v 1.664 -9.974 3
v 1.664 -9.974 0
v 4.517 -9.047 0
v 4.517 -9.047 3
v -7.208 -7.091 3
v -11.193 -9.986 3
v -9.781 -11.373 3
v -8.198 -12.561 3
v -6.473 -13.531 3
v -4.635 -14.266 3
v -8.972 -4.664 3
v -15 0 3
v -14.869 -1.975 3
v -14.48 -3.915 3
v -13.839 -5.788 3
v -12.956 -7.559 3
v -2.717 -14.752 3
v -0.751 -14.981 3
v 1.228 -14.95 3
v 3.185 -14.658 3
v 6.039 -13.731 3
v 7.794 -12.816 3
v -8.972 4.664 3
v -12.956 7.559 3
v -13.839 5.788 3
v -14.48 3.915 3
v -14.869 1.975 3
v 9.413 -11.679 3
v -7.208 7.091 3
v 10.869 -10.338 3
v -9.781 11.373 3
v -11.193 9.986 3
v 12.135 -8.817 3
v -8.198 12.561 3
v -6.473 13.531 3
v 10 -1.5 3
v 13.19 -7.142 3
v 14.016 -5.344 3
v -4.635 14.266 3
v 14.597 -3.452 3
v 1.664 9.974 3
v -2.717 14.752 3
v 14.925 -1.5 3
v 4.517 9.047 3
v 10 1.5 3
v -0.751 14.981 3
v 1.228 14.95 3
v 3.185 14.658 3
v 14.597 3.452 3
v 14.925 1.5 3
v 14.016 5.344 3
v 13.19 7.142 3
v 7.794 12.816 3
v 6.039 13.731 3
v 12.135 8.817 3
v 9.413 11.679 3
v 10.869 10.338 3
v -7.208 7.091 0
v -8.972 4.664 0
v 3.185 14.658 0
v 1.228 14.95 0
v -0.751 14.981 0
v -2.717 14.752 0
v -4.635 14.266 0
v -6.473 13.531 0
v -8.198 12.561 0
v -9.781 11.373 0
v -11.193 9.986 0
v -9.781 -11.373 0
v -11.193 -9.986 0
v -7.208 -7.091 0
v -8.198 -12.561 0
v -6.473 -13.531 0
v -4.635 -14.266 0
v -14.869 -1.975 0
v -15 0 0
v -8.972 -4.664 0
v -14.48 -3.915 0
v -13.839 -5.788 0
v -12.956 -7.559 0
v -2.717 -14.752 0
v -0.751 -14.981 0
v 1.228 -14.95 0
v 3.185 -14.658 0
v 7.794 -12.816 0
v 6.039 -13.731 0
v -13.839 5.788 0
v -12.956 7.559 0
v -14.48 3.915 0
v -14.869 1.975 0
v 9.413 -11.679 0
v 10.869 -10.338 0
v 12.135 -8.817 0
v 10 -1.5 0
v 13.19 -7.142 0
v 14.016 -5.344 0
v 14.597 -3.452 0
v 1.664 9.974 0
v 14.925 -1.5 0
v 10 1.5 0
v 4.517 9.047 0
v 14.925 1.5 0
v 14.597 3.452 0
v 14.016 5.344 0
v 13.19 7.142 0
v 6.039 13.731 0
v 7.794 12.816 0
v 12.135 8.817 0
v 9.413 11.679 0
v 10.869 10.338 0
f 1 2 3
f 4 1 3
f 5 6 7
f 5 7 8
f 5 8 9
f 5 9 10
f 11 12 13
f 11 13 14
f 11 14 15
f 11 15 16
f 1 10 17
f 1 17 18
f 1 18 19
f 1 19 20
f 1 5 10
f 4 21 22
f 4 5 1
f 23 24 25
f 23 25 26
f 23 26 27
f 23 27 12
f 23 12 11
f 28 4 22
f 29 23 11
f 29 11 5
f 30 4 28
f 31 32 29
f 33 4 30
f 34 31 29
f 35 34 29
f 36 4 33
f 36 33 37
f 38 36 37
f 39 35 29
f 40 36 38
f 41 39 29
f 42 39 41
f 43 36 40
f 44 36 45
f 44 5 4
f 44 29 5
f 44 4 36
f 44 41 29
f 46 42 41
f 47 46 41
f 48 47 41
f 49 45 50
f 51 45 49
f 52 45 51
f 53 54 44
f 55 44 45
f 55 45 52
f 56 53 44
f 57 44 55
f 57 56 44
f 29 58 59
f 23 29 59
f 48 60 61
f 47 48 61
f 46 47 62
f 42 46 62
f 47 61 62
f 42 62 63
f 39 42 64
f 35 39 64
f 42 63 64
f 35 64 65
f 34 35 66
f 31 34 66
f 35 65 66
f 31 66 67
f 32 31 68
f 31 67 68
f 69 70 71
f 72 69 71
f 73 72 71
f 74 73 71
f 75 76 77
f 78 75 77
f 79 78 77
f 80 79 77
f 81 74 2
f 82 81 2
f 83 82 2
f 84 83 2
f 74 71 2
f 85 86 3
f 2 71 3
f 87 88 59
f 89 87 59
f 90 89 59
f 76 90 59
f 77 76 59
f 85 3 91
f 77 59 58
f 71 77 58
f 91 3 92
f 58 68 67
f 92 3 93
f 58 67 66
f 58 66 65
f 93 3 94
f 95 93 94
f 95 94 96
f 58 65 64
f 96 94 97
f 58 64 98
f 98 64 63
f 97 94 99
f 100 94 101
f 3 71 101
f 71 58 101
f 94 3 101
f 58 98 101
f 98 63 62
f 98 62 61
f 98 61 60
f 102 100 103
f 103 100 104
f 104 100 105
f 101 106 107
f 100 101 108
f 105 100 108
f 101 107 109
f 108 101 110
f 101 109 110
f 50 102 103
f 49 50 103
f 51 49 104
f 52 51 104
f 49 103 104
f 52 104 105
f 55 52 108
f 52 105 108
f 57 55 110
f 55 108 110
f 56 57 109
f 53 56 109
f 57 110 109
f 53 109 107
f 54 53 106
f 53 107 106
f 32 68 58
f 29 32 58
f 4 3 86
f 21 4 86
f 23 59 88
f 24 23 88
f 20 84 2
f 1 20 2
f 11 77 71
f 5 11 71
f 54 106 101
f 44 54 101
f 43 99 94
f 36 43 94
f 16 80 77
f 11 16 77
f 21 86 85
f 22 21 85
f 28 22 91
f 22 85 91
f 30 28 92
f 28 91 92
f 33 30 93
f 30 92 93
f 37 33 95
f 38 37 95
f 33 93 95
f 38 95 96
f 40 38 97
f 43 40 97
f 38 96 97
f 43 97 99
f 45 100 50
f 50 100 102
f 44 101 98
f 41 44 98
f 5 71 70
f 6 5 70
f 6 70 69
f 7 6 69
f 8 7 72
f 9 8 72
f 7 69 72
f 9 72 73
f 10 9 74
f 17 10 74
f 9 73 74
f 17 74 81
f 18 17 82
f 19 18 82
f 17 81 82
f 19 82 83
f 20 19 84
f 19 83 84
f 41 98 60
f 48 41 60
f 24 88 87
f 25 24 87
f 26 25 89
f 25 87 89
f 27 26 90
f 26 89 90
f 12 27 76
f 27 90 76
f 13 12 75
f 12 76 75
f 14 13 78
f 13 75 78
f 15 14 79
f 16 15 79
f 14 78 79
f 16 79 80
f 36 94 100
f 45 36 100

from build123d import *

# Parameters (mm, degrees)
SALIENTE_EXTRUIR1_DEPTH = 3


with BuildPart() as part:
    # Croquis1 → Saliente-Extruir1 (new body)
    with BuildSketch(Plane.XY):
        with BuildLine():
            Line((14.924811557, -1.5), (10, -1.5))
            Line((10, -1.5), (10, 1.5))
            Line((10, 1.5), (14.924811557, 1.5))
            ThreePointArc((14.924811557, 1.5), (12.135254916, 8.816778784), (6.038605183, 13.730813794))
            Line((6.038605183, 13.730813794), (4.516754718, 9.047039671))
            Line((4.516754718, 9.047039671), (1.663585169, 9.974090655))
            Line((1.663585169, 9.974090655), (3.185435634, 14.657864777))
            ThreePointArc((3.185435634, 14.657864777), (-4.635254916, 14.265847744), (-11.192748309, 9.986109618))
            Line((-11.192748309, 9.986109618), (-7.208492065, 7.091378014))
            Line((-7.208492065, 7.091378014), (-8.971847822, 4.664327031))
            Line((-8.971847822, 4.664327031), (-12.956104066, 7.559058635))
            ThreePointArc((-12.956104066, 7.559058635), (-15, 0), (-12.956104066, -7.559058635))
            Line((-12.956104066, -7.559058635), (-8.971847822, -4.664327031))
            Line((-8.971847822, -4.664327031), (-7.208492065, -7.091378014))
            Line((-7.208492065, -7.091378014), (-11.192748309, -9.986109618))
            ThreePointArc((-11.192748309, -9.986109618), (-4.635254916, -14.265847744), (3.185435634, -14.657864777))
            Line((3.185435634, -14.657864777), (1.663585169, -9.974090655))
            Line((1.663585169, -9.974090655), (4.516754718, -9.047039671))
            Line((4.516754718, -9.047039671), (6.038605183, -13.730813794))
            ThreePointArc((6.038605183, -13.730813794), (12.135254916, -8.816778784), (14.924811557, -1.5))
        make_face()
    extrude(amount=SALIENTE_EXTRUIR1_DEPTH)


solid = part.part
